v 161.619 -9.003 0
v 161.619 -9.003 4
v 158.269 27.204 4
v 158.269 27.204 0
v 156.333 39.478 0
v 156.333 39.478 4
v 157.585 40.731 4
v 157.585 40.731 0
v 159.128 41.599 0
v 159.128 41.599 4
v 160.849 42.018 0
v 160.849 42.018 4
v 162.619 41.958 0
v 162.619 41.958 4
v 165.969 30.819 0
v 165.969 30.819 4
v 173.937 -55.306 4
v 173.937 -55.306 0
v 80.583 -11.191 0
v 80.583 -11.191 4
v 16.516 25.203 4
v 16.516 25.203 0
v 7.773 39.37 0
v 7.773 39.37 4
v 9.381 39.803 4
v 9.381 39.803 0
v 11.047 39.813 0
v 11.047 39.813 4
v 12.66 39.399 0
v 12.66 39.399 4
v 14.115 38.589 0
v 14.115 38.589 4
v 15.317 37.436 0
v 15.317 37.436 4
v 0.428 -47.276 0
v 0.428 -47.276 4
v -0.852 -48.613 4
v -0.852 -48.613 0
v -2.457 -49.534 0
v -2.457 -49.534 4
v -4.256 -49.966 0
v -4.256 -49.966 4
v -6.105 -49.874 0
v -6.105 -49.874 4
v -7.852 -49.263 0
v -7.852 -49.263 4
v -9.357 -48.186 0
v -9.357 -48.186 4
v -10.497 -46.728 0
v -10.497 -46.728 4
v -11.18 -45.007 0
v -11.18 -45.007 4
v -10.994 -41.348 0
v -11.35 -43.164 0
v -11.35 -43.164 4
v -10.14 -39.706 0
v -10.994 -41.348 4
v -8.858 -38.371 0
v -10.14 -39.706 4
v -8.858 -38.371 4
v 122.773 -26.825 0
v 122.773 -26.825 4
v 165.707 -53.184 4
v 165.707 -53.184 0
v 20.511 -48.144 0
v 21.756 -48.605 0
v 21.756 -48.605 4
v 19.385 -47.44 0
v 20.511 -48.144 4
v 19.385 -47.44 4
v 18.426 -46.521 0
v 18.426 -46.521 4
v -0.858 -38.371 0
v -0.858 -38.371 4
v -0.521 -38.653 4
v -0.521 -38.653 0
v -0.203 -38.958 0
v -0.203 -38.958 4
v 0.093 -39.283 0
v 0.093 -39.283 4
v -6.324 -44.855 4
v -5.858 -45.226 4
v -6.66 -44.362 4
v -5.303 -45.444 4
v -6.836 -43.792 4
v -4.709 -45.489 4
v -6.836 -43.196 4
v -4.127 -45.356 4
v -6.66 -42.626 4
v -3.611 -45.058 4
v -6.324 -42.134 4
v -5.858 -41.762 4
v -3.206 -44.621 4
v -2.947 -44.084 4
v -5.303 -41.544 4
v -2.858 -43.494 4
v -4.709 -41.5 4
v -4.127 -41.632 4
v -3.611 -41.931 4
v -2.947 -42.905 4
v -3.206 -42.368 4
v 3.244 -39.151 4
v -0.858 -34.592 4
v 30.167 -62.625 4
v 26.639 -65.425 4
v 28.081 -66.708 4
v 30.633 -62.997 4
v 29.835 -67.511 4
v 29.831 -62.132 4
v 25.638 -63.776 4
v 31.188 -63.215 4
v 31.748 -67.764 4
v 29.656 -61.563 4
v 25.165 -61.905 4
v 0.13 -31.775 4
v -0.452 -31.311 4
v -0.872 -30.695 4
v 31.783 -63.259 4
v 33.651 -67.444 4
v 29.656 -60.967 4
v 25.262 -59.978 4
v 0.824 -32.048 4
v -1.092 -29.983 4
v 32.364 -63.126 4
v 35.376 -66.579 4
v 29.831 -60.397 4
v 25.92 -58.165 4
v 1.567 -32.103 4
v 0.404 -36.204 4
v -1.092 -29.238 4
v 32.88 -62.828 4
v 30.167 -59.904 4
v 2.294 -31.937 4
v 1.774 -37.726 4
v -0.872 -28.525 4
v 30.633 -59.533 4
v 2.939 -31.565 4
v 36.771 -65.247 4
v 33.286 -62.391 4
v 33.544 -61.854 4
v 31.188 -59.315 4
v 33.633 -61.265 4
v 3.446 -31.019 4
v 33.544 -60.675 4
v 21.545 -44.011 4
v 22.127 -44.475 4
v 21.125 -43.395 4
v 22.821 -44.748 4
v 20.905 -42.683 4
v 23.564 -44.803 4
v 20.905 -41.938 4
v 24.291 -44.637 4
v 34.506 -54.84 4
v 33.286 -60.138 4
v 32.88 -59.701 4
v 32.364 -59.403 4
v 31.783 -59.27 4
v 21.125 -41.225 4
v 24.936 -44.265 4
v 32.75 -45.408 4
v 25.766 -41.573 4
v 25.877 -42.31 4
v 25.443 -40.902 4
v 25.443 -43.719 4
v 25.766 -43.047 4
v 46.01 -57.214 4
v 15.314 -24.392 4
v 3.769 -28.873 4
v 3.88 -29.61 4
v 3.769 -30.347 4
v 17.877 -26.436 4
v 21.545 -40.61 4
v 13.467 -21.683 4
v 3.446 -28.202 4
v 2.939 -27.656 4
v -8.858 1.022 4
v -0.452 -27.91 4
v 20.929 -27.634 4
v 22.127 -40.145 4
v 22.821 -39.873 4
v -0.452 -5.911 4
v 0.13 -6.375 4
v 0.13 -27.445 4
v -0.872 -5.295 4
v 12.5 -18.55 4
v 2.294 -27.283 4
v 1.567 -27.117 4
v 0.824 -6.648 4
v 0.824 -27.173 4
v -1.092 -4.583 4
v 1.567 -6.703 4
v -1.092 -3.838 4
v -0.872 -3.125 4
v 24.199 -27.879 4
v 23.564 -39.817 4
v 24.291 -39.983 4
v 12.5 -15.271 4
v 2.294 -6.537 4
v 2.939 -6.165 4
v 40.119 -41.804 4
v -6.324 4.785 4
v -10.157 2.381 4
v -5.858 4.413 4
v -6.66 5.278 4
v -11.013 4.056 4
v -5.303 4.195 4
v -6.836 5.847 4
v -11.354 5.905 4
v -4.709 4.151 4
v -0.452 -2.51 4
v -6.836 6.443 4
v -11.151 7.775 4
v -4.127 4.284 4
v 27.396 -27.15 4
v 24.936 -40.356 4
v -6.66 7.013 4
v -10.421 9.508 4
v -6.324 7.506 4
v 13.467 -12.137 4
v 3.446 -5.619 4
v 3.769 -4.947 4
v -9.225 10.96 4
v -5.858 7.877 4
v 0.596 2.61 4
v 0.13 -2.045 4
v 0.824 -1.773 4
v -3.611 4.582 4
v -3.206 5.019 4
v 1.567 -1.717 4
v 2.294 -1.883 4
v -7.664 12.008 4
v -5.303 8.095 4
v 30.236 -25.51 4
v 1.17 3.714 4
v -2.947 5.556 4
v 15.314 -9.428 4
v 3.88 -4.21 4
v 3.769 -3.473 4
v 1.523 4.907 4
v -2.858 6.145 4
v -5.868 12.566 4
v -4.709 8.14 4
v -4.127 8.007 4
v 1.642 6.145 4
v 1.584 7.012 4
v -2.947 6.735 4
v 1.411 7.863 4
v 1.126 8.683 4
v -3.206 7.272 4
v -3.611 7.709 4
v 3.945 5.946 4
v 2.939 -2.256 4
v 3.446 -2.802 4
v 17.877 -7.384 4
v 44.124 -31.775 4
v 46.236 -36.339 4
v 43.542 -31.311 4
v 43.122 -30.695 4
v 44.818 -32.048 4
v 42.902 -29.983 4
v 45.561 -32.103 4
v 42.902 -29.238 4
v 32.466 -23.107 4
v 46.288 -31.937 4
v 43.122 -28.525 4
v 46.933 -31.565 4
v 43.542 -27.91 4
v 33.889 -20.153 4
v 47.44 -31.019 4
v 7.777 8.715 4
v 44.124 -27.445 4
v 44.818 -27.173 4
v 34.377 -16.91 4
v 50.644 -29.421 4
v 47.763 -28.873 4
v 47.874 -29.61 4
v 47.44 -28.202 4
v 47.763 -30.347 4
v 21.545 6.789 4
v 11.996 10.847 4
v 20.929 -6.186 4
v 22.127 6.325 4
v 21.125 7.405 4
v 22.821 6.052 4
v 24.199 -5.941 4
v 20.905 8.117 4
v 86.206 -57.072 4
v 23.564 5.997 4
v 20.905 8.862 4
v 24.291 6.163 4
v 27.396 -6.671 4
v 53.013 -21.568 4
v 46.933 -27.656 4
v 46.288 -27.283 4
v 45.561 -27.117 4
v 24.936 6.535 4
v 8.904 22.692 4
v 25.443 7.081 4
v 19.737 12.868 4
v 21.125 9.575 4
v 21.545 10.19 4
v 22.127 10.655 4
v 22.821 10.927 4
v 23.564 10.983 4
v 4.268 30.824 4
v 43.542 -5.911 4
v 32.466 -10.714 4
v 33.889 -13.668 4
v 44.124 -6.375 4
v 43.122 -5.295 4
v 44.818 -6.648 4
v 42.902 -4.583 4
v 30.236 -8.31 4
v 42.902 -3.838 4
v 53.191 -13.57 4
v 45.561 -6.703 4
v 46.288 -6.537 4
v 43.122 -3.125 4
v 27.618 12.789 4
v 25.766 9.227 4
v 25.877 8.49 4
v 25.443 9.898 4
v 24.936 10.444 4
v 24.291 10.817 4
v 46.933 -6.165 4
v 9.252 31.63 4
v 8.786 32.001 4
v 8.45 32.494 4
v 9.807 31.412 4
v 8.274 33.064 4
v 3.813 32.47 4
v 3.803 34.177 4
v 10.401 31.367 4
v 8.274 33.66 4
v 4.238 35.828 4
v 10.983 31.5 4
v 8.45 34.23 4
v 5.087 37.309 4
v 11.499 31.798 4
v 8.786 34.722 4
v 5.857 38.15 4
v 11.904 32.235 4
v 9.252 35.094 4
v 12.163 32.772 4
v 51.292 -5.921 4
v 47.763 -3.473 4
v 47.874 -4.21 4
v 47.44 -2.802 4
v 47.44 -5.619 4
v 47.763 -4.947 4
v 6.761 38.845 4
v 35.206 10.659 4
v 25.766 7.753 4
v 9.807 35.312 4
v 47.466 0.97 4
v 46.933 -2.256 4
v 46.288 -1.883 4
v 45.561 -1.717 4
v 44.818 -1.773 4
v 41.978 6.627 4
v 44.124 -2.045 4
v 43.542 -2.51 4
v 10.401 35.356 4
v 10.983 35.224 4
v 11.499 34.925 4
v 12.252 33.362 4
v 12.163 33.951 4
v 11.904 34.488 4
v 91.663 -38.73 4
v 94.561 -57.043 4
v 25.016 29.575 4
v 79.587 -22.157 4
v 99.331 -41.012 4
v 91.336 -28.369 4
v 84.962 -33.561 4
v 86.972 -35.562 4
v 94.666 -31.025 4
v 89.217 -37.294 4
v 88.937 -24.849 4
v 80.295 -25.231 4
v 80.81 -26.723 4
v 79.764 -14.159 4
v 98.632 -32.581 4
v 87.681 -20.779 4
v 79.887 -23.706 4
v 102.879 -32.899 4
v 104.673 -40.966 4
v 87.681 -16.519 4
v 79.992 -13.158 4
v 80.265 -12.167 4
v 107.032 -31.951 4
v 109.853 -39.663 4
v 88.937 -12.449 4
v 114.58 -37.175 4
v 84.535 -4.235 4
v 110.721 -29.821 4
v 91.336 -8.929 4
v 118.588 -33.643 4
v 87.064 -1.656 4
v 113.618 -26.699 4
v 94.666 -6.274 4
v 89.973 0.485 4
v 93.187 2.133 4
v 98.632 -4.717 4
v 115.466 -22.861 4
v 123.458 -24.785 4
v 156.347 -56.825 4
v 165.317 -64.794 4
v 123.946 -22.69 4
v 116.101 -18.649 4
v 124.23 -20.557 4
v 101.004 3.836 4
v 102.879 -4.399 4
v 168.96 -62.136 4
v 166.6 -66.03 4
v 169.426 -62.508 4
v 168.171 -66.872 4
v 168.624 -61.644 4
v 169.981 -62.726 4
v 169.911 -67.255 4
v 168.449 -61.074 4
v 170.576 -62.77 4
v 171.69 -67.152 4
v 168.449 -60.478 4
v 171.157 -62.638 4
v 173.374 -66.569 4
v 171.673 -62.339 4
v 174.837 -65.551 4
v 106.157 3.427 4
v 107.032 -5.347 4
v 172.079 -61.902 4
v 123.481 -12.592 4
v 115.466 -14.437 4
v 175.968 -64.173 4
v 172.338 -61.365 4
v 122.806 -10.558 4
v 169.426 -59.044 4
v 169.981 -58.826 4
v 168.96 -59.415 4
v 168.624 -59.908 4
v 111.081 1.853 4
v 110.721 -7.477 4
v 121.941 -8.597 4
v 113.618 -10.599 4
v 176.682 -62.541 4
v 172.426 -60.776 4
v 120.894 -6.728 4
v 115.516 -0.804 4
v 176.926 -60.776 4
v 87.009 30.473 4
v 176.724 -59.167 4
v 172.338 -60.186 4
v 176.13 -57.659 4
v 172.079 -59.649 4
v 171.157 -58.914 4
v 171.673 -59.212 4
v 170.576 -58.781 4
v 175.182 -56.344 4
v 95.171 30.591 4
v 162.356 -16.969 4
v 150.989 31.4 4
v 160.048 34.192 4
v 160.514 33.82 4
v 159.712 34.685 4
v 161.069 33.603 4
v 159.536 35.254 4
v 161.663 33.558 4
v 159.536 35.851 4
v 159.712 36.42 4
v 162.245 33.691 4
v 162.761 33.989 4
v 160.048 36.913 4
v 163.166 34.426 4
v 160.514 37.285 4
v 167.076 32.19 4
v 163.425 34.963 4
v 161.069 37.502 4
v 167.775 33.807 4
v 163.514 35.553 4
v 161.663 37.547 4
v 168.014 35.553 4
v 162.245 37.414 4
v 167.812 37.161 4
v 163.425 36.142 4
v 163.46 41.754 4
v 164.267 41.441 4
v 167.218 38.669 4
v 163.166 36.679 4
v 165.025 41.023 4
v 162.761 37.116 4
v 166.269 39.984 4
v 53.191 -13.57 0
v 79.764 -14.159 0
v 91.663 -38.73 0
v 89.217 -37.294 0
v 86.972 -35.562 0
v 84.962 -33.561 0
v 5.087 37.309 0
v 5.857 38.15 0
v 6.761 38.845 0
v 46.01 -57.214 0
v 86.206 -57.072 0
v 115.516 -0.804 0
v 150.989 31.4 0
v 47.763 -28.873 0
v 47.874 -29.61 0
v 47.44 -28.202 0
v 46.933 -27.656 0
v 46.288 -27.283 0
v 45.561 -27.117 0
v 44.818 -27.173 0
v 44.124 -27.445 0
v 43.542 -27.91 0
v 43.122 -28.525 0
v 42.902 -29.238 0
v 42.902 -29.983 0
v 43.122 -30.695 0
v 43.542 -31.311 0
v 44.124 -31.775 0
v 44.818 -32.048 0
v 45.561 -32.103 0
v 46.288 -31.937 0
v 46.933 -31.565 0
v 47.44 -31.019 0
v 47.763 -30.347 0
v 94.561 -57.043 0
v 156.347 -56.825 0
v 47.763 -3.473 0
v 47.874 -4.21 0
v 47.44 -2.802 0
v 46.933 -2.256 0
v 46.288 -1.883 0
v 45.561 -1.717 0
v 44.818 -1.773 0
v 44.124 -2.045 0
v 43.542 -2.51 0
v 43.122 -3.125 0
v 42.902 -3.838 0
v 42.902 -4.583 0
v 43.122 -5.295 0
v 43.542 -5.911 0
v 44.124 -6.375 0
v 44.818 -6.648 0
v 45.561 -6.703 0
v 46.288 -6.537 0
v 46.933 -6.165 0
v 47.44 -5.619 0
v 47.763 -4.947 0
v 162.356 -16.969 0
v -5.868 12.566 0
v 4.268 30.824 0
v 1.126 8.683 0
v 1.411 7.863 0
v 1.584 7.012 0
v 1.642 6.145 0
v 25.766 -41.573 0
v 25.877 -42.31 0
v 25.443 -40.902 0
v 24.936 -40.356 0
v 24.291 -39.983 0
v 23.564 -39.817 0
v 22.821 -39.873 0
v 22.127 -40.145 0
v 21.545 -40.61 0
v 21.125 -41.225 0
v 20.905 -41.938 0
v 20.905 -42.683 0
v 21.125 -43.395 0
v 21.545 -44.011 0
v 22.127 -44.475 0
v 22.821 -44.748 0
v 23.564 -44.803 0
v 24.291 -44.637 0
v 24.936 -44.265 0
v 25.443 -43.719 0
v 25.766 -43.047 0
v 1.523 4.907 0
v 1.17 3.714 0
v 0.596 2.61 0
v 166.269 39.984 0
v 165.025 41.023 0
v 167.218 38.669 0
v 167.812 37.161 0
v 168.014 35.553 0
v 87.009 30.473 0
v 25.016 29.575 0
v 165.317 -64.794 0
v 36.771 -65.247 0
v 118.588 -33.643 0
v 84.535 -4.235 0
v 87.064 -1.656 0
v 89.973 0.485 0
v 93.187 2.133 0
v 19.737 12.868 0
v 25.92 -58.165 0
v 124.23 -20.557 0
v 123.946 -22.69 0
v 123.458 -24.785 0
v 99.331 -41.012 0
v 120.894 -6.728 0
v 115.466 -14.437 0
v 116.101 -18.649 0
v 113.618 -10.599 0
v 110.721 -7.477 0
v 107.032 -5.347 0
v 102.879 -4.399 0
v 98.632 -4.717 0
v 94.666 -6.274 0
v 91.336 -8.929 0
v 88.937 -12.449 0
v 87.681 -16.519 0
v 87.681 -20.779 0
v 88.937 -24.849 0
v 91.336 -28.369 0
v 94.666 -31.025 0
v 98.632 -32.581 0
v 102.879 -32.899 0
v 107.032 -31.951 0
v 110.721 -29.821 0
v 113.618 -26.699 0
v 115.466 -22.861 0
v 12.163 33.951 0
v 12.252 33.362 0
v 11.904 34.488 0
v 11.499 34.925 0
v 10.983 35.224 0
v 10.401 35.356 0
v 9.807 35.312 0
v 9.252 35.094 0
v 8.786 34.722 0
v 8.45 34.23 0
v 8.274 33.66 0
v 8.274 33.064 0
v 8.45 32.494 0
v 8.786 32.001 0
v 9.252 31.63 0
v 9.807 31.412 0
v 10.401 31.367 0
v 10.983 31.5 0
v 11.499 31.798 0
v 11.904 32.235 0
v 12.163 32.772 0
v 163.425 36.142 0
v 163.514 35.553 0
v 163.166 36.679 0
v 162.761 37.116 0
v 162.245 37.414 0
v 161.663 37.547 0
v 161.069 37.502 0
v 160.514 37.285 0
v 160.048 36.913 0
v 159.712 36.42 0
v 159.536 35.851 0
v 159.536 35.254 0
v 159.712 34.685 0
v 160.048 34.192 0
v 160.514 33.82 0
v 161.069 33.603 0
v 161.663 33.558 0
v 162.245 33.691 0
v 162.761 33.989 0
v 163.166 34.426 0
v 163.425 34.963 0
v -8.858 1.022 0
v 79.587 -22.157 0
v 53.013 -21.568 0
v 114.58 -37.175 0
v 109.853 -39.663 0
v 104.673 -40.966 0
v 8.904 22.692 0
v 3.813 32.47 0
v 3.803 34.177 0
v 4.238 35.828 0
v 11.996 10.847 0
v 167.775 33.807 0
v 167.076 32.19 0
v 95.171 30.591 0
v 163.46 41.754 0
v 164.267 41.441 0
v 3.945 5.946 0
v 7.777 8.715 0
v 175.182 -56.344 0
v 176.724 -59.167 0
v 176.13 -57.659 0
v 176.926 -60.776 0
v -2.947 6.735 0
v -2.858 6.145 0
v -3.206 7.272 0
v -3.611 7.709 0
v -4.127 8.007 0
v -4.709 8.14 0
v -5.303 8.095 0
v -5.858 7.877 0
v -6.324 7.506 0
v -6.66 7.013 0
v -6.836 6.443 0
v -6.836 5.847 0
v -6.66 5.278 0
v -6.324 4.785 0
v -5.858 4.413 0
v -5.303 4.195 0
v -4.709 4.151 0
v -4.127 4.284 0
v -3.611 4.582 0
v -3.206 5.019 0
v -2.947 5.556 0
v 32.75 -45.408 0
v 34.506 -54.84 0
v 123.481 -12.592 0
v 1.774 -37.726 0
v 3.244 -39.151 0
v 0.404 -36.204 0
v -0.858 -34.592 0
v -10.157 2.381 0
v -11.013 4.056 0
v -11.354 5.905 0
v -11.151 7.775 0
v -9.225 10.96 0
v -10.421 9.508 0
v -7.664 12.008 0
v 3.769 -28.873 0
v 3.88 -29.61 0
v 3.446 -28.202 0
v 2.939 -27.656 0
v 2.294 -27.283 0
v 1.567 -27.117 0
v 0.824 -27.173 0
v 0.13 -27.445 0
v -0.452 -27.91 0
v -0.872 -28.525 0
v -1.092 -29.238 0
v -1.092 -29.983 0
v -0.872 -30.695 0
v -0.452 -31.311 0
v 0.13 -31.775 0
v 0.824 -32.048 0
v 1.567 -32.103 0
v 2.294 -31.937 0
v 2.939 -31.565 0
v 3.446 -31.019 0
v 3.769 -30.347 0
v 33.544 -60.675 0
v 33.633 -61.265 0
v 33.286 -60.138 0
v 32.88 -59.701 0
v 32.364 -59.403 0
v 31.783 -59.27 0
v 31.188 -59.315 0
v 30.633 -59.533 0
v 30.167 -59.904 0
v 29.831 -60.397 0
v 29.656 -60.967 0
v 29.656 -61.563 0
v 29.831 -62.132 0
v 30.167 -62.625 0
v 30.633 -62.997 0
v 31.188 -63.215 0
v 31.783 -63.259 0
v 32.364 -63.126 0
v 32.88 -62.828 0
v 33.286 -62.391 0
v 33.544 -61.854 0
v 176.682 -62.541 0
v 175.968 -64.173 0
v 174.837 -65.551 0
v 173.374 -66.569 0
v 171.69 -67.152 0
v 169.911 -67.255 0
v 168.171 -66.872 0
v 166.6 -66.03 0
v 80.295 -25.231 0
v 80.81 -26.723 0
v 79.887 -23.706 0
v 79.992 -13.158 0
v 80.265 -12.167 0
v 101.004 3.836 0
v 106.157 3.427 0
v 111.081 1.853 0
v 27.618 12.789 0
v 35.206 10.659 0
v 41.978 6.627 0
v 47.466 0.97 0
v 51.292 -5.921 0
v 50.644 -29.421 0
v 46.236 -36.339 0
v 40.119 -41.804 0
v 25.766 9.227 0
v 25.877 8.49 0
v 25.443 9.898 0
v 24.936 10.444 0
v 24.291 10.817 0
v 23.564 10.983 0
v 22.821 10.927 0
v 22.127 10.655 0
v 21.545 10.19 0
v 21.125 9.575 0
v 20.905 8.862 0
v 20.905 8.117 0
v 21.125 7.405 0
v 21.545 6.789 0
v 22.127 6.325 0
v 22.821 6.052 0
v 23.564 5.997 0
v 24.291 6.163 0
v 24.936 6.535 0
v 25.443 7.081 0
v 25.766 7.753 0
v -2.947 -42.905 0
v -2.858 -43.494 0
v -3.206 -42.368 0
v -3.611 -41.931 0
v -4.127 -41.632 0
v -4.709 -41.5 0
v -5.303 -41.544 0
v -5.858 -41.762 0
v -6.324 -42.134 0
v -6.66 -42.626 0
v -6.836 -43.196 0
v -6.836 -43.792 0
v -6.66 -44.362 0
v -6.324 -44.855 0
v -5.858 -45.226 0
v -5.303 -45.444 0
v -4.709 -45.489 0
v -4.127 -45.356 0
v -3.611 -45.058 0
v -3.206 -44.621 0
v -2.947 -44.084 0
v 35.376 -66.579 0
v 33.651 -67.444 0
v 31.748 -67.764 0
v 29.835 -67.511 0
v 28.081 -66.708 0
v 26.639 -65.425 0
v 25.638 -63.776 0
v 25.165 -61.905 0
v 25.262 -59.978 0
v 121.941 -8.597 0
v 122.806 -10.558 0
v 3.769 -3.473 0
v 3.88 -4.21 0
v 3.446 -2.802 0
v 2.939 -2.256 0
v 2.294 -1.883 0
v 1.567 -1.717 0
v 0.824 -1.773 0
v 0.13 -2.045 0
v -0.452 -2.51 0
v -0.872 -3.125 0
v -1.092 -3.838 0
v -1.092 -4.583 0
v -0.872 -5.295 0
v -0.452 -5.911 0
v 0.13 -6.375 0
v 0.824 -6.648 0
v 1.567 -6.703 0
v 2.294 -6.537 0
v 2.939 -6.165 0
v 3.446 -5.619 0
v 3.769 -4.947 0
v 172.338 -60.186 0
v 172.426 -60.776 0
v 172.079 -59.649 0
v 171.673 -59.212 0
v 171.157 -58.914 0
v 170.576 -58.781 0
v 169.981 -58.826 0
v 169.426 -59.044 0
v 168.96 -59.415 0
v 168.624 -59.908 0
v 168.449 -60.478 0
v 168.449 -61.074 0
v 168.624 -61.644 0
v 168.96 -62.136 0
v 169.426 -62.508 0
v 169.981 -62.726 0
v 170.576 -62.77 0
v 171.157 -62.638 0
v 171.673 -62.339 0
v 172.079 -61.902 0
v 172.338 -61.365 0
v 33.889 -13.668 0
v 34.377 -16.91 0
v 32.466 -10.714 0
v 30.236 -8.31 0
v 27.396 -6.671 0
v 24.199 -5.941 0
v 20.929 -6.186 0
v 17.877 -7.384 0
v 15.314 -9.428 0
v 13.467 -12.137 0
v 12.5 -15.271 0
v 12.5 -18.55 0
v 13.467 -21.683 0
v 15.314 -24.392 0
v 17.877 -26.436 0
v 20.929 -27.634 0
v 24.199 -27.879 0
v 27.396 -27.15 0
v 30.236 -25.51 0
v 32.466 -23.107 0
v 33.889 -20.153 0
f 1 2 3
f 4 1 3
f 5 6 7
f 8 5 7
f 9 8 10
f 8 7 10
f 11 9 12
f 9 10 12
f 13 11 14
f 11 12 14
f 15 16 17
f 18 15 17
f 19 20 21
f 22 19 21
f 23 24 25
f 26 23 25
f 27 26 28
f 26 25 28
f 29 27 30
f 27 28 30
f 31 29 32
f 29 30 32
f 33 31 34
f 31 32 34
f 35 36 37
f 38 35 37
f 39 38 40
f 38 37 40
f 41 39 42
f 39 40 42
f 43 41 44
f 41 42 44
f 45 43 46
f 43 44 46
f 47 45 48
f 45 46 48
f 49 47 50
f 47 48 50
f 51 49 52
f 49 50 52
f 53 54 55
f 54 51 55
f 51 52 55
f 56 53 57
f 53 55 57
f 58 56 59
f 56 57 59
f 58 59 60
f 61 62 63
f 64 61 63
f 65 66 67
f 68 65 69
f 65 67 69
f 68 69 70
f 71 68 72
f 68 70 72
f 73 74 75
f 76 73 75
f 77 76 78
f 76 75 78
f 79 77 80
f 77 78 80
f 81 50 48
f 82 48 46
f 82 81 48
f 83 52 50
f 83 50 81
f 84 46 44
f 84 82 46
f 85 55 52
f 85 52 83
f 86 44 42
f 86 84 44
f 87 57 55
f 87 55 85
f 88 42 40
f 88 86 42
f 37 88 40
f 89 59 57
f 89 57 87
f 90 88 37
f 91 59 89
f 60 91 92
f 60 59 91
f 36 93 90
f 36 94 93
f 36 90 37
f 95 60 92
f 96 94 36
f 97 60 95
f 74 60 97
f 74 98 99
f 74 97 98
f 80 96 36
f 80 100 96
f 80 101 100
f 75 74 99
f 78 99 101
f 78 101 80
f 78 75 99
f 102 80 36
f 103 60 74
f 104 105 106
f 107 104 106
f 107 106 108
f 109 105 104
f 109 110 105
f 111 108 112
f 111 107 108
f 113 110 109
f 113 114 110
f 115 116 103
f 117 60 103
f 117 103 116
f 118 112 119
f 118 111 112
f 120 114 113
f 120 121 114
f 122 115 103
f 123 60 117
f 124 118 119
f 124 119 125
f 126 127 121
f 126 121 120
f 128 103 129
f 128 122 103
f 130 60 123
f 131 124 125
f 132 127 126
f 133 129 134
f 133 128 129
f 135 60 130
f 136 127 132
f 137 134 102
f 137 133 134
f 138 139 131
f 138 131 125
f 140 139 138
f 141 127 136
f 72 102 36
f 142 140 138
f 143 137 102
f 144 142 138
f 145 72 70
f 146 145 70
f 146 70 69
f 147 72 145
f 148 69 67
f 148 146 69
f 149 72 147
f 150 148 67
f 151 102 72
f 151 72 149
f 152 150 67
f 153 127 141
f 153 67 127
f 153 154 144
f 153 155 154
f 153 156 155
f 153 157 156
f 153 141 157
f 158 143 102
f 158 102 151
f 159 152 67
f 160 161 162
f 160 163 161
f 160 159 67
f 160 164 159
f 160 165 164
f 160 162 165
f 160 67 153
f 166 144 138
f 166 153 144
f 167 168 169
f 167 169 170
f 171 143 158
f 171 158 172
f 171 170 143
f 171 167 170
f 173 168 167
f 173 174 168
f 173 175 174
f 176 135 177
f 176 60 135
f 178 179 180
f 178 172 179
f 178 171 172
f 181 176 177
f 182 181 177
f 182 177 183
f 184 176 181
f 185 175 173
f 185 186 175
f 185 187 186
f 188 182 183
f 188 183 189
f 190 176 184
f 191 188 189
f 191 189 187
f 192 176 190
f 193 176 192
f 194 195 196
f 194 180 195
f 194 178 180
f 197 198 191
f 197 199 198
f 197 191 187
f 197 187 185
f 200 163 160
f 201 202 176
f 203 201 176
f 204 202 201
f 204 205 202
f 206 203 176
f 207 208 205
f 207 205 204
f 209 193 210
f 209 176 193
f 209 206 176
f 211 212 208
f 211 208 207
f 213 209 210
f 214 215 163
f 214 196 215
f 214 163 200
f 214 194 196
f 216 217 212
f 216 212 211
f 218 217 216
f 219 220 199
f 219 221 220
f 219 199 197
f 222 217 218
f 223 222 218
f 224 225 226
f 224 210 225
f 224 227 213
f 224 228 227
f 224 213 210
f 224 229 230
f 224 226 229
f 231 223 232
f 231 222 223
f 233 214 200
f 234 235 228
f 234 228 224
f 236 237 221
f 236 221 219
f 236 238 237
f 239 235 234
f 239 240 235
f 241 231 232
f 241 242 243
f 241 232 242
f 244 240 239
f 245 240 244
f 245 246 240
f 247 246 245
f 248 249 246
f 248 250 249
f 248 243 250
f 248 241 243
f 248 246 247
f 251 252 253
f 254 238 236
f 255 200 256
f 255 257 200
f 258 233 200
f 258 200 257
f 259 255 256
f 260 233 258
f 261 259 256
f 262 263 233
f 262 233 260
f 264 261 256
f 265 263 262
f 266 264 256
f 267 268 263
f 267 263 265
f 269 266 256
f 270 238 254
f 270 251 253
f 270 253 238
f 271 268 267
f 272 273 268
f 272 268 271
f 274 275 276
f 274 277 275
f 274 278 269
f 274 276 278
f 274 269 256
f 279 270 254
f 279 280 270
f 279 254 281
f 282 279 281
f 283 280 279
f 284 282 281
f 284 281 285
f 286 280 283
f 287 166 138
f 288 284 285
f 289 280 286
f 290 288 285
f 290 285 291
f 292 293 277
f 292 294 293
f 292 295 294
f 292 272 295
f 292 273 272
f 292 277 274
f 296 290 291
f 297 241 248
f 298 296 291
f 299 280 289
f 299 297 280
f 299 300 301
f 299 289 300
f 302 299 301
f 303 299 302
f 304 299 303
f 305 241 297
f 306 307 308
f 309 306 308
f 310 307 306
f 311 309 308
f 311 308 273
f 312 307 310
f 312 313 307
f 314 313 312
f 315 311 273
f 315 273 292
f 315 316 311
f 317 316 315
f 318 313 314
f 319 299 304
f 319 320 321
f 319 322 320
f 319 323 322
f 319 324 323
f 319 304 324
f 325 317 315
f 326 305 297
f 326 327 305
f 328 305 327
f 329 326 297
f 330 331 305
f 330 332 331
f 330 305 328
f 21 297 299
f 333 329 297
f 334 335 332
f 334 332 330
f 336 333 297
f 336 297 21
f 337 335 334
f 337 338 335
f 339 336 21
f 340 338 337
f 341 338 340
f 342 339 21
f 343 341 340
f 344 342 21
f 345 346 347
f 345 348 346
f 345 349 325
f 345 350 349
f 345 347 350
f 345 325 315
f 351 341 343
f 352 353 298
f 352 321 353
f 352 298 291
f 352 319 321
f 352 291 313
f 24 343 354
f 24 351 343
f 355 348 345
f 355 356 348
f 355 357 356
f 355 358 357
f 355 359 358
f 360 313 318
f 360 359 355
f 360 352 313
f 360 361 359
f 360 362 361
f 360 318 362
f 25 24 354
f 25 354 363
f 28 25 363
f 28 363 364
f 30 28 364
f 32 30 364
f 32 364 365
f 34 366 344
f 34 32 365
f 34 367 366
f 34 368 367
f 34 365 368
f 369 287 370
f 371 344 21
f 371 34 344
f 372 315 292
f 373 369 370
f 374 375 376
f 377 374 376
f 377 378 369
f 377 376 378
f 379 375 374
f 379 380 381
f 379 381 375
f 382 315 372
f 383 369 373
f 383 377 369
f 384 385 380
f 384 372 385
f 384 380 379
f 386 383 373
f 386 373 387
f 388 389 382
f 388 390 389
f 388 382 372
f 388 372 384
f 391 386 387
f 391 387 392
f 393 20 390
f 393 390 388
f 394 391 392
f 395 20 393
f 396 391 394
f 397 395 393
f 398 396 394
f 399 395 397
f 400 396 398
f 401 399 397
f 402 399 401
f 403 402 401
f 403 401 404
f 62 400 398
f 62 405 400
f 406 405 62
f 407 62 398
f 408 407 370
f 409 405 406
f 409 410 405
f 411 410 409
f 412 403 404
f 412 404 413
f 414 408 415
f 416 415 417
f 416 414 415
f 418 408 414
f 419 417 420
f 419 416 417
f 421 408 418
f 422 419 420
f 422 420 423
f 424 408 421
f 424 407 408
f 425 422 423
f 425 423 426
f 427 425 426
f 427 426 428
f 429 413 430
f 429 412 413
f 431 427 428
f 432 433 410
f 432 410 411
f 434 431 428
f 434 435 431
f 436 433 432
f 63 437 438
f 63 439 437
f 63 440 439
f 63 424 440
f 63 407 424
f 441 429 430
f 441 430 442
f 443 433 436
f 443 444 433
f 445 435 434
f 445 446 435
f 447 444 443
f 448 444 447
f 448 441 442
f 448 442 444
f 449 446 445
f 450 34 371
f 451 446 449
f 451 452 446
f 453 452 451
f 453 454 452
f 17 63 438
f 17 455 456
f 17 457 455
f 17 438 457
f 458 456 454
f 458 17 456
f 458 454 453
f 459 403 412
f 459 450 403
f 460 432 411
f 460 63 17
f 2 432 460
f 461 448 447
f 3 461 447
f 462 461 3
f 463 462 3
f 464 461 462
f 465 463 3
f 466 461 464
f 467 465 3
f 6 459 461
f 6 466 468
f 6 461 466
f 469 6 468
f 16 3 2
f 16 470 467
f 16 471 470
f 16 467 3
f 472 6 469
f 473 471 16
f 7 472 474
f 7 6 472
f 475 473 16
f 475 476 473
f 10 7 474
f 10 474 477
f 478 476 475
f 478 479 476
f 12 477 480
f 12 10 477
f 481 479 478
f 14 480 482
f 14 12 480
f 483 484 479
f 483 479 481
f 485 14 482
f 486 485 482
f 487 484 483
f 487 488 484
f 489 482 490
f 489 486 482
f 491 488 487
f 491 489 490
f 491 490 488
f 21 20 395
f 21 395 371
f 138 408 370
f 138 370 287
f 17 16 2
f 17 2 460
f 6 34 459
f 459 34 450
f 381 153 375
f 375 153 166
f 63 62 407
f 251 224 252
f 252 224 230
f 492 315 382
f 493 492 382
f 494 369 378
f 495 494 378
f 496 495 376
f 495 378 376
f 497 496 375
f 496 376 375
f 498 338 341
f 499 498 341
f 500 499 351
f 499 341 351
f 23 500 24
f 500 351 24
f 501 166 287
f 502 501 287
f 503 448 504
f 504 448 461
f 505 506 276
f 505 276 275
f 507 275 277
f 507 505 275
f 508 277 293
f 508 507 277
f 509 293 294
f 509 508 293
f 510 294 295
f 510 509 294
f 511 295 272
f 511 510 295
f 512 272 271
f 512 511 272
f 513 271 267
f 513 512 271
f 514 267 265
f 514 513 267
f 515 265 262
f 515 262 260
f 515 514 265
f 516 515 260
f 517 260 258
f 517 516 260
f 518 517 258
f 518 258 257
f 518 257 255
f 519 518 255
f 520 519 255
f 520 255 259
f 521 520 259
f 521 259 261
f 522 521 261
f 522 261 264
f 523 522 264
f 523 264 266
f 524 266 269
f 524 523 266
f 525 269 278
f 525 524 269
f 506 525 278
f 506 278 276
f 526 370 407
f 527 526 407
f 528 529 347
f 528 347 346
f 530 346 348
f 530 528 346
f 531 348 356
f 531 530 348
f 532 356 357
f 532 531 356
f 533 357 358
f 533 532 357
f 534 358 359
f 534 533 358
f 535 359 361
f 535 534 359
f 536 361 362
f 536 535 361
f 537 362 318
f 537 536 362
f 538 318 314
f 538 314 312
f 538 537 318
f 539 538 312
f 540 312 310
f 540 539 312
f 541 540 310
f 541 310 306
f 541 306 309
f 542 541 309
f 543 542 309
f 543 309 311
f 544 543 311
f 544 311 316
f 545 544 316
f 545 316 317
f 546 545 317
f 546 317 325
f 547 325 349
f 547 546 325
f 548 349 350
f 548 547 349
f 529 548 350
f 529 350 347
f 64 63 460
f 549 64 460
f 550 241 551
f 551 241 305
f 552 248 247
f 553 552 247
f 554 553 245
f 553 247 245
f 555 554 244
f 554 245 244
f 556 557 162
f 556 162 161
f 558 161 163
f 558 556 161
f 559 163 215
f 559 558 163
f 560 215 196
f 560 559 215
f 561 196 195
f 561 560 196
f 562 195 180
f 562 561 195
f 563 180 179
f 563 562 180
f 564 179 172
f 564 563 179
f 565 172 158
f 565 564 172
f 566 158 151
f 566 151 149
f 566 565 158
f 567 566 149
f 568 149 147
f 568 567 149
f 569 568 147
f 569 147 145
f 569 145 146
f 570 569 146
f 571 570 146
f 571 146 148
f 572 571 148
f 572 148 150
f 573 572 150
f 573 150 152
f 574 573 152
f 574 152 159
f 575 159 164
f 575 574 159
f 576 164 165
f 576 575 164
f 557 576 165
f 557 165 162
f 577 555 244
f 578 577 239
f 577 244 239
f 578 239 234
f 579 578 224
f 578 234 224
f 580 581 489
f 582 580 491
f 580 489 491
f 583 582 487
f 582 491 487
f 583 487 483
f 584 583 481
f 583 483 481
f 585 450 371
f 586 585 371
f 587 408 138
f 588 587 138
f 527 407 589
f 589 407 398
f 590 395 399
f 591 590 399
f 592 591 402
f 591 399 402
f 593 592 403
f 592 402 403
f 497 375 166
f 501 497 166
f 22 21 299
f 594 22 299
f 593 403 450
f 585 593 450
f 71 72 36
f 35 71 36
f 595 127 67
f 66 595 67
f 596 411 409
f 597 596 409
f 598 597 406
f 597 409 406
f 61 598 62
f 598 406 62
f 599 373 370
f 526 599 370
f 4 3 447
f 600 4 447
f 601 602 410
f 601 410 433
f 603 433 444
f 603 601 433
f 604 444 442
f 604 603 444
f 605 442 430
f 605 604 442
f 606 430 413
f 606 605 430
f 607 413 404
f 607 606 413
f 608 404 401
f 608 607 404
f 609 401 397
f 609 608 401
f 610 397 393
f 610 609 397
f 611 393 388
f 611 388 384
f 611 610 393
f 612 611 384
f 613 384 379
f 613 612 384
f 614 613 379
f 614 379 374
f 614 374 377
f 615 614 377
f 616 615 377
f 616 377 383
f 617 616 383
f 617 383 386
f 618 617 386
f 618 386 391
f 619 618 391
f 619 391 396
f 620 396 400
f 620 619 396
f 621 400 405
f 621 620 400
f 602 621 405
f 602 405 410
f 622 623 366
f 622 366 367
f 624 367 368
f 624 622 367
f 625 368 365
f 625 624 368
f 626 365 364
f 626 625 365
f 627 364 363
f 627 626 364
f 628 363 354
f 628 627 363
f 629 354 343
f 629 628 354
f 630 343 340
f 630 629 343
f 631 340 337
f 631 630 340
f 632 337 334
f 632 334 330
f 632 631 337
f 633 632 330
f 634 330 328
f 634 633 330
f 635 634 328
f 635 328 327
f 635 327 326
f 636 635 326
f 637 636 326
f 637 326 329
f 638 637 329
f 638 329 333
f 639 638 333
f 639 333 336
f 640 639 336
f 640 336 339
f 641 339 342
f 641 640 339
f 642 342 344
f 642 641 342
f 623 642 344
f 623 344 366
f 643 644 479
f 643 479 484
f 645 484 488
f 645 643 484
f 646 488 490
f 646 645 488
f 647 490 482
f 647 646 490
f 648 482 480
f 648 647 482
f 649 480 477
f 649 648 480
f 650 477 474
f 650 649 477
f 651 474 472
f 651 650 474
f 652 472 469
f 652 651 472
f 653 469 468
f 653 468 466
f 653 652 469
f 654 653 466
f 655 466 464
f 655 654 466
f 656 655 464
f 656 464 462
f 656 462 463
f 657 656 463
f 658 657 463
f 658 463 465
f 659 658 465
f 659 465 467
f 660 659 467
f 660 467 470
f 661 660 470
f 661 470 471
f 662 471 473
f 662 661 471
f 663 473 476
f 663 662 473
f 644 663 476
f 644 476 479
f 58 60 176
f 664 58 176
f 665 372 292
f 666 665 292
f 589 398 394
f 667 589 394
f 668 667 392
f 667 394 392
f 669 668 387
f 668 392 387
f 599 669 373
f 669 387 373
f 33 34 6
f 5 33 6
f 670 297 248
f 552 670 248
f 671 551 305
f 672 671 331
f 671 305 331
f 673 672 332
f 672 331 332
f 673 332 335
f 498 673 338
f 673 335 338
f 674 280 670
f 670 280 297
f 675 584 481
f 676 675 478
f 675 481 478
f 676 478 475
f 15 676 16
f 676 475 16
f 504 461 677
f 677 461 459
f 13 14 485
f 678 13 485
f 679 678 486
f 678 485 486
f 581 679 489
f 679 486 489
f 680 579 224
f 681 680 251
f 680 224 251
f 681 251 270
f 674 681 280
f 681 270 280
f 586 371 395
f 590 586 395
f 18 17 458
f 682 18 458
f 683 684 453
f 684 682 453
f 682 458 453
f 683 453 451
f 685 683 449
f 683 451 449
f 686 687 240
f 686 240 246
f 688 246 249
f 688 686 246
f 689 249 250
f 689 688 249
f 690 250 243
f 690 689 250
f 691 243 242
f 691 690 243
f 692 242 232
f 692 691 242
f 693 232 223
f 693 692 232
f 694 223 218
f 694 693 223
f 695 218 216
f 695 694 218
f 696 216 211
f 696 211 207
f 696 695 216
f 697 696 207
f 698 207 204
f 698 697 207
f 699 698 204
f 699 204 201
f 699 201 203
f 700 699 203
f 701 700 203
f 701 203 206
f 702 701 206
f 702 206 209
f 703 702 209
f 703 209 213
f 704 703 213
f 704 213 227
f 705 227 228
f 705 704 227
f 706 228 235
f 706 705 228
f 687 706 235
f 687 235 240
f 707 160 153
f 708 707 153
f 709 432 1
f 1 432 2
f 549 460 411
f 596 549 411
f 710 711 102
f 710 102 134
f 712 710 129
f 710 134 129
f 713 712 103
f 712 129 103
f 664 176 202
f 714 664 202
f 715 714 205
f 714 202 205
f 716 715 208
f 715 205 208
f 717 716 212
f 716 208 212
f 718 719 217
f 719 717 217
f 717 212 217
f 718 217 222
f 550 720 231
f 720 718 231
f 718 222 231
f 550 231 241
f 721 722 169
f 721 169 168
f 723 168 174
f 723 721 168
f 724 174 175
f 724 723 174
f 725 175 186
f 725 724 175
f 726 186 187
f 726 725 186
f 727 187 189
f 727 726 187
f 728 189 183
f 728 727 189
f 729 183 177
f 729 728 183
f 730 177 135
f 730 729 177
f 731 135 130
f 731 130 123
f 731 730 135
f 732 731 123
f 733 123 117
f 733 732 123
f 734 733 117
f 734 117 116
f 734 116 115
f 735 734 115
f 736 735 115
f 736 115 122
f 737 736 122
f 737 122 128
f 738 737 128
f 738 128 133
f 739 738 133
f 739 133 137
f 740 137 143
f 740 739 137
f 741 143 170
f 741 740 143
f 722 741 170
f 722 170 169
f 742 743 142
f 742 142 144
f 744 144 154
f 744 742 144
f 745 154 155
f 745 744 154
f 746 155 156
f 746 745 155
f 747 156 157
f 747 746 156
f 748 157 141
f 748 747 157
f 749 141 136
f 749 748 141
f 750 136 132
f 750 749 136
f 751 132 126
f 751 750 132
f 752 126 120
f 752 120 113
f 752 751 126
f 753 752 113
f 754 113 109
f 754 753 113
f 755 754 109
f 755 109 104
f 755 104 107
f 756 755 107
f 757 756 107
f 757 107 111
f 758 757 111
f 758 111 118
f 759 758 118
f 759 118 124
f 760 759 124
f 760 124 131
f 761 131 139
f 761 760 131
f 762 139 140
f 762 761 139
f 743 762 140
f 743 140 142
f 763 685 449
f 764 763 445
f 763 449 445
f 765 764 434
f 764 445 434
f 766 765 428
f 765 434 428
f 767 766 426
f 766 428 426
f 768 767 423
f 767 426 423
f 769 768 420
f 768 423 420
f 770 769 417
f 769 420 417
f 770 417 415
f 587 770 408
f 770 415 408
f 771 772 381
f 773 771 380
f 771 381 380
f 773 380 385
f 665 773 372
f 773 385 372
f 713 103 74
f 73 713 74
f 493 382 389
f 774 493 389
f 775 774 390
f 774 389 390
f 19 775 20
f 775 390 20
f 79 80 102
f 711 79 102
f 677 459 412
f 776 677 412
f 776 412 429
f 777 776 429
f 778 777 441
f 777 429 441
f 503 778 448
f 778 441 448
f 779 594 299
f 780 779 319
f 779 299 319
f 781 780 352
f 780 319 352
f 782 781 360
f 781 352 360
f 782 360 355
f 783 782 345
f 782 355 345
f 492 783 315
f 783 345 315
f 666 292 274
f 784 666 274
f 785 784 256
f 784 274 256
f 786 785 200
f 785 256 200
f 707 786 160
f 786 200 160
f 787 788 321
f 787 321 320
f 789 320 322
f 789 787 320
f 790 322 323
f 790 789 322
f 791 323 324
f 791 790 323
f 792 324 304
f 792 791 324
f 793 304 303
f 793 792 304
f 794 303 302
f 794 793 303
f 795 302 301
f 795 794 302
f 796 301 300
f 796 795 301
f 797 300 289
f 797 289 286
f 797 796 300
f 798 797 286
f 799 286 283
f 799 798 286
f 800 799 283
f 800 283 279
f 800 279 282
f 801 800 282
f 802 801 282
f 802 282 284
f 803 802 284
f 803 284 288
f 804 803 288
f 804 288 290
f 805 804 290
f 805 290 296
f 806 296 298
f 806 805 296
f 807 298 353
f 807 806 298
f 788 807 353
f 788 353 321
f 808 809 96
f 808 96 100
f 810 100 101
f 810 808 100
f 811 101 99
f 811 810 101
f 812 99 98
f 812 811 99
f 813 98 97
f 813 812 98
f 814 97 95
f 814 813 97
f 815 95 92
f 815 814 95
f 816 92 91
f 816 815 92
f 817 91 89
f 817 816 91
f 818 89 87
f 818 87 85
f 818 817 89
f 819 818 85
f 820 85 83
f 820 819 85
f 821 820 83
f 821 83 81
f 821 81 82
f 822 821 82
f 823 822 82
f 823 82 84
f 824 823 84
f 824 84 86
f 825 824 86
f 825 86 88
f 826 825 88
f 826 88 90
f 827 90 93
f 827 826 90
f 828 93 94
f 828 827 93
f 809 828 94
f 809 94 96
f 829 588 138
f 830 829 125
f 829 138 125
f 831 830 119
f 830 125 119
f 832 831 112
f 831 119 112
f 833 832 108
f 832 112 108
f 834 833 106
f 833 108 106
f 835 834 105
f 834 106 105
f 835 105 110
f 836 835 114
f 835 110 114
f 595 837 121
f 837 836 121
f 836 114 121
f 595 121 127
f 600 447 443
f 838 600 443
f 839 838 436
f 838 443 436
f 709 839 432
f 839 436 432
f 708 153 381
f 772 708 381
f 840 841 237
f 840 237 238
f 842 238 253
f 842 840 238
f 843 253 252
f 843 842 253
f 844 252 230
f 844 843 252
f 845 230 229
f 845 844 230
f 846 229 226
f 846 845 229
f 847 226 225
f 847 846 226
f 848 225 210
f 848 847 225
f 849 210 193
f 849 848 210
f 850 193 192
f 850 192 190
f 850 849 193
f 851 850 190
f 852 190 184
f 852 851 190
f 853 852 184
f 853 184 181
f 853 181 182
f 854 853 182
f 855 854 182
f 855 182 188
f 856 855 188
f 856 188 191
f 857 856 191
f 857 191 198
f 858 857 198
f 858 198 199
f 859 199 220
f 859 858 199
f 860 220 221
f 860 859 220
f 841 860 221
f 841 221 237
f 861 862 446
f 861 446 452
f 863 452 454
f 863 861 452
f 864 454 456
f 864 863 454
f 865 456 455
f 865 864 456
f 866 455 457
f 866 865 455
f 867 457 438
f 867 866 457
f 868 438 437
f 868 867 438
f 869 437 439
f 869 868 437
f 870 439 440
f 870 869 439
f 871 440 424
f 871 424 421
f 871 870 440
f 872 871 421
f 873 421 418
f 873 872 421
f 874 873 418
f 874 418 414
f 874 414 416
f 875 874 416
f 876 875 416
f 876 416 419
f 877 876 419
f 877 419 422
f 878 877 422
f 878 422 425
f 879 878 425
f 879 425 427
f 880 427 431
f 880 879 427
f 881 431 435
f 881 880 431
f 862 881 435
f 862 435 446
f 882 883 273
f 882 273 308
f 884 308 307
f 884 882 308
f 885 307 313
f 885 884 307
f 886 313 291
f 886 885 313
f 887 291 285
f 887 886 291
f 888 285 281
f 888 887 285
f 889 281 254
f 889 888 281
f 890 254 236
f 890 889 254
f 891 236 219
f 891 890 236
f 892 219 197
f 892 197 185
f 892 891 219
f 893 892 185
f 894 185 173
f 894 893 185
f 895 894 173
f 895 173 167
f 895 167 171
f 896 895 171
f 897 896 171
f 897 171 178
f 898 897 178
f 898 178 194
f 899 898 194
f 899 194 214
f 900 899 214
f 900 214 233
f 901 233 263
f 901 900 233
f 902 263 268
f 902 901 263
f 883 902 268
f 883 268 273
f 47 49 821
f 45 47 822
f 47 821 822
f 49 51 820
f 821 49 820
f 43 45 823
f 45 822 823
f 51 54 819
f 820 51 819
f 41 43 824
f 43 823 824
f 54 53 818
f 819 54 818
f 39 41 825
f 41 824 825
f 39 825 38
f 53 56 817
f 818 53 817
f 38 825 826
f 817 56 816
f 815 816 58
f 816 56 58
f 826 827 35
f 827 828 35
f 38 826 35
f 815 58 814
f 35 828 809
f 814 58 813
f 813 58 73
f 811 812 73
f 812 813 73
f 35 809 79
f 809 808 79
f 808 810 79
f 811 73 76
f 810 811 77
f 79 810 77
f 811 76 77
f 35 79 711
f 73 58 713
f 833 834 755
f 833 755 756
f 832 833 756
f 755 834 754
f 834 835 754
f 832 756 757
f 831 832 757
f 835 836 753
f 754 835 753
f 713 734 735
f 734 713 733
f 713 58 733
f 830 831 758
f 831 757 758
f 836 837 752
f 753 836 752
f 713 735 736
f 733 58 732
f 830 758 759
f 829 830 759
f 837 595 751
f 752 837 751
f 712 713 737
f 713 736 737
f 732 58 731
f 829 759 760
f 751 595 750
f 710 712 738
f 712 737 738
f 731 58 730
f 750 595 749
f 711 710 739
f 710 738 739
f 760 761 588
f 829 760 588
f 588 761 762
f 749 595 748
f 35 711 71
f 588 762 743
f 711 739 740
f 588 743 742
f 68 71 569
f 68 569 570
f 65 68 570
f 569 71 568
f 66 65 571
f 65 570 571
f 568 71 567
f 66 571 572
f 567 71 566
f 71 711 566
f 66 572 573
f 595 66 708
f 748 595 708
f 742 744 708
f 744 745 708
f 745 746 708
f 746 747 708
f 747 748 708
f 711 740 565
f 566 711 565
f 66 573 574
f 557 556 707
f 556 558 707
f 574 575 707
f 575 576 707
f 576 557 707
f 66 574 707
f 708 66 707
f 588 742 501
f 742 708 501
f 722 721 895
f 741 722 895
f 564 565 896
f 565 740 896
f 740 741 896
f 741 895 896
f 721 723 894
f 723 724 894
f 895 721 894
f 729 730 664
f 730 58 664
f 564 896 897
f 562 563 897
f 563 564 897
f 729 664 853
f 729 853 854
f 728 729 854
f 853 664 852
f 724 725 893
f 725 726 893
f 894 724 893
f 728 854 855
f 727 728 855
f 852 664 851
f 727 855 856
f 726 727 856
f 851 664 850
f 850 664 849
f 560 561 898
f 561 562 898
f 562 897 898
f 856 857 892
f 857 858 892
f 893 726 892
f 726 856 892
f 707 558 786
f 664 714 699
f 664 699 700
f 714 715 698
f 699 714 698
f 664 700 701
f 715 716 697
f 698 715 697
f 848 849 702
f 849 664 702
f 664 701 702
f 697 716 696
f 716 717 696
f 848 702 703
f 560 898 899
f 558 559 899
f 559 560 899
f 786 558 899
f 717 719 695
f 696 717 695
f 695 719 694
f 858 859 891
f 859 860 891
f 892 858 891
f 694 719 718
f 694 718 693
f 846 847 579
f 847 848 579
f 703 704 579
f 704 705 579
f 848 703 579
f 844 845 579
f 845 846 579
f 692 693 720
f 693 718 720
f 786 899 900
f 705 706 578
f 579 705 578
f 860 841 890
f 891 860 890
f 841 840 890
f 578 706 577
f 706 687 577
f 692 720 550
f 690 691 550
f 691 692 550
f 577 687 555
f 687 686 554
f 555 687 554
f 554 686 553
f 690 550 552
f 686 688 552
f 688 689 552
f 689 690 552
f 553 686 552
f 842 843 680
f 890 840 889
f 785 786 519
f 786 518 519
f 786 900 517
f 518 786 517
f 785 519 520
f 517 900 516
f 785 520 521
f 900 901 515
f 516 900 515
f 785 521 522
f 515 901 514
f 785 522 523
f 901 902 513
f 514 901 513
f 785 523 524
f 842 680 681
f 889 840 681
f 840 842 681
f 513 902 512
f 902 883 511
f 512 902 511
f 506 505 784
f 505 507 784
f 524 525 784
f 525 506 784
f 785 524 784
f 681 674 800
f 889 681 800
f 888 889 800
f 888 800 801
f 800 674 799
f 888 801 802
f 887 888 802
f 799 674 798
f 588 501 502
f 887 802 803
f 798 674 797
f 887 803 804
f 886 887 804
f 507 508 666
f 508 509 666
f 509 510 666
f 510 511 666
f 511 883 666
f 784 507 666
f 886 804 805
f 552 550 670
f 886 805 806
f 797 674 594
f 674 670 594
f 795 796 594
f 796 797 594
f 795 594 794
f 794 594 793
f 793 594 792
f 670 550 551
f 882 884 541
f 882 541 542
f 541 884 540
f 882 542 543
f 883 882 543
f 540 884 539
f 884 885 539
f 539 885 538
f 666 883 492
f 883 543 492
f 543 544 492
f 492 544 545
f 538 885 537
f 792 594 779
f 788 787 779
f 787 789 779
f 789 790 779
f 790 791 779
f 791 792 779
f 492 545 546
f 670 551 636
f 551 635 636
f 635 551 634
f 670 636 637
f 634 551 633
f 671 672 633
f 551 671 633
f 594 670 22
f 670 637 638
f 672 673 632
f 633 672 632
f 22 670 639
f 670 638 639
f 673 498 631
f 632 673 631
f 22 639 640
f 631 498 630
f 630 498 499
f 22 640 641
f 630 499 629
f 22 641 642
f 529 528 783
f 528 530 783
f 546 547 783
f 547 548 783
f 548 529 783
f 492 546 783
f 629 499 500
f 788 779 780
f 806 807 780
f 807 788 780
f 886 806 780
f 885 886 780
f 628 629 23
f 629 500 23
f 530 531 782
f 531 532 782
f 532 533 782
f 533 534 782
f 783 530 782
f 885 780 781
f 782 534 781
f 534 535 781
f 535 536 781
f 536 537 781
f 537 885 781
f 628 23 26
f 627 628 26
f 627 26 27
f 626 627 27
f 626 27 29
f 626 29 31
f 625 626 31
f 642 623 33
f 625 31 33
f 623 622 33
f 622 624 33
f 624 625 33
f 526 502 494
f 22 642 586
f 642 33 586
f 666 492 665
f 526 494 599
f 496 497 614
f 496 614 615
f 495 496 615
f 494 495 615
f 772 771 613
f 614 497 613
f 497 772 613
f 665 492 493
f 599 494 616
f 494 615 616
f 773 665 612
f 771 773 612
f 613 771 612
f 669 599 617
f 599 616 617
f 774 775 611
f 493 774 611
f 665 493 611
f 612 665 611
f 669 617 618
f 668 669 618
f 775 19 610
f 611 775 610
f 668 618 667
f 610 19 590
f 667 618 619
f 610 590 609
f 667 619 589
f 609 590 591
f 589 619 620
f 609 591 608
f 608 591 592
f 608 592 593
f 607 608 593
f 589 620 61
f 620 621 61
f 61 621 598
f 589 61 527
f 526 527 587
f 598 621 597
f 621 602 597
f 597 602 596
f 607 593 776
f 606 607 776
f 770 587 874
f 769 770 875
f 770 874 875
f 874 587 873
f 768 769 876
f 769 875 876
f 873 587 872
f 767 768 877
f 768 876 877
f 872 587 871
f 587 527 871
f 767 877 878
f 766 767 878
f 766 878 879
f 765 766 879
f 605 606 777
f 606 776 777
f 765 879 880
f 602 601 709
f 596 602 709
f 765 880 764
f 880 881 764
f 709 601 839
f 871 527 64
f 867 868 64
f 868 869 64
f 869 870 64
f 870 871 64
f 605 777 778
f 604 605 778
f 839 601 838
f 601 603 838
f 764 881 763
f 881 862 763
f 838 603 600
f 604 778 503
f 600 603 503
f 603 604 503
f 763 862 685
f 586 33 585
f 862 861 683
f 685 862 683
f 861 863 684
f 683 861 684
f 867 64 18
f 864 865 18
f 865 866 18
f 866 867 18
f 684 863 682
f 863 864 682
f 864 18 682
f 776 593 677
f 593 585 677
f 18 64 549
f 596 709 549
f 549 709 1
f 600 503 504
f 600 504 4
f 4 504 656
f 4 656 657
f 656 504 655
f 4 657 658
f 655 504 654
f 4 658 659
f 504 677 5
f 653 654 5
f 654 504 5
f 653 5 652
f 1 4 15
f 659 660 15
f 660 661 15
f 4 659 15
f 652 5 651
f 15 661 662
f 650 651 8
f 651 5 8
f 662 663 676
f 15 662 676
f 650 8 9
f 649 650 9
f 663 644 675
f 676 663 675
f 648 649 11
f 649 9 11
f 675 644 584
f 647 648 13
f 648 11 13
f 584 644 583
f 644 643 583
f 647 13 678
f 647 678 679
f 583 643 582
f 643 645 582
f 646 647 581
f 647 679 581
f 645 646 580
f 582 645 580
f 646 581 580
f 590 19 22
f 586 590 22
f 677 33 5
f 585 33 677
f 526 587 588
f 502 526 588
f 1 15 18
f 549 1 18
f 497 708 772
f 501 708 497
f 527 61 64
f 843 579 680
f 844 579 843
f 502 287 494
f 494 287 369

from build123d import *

# Parameters (mm, degrees)
SKETCH1_W           = 267.603014698
SKETCH1_H           = 153.453144762
SKETCH1_R           = 2
SKETCH1_R_2         = 14.29
SKETCH1_R_3         = 2.499999953
SKETCH1_R_4         = 11
BOSS_EXTRUDE1_DEPTH = 4
SKETCH2_W           = 305.655174706
SKETCH2_H           = 186.291776367
CUT_EXTRUDE8_DEPTH  = 10


with BuildPart() as part:
    # Sketch1 → Boss-Extrude1 (new body)
    with BuildSketch(Plane.XY):
        with Locations((77.263379783, -10.843771022)):
            Rectangle(SKETCH1_W, SKETCH1_H)
        with Locations((-4.85811184, -43.49422294)):
            Circle(SKETCH1_R, mode=Mode.SUBTRACT)
        with Locations((101.811349412, -18.649052962)):
            Circle(SKETCH1_R_2, mode=Mode.SUBTRACT)
        with Locations((31.633252021, -61.264657987)):
            Circle(SKETCH1_R, mode=Mode.SUBTRACT)
        with Locations((10.251922178, 33.361755578)):
            Circle(SKETCH1_R, mode=Mode.SUBTRACT)
        with Locations((170.426367515, -60.775756941)):
            Circle(SKETCH1_R, mode=Mode.SUBTRACT)
        with Locations((161.513898191, 35.55251649)):
            Circle(SKETCH1_R, mode=Mode.SUBTRACT)
        with Locations((-4.85811184, 6.145317428)):
            Circle(SKETCH1_R, mode=Mode.SUBTRACT)
        with Locations((23.377209906, -42.310207828)):
            Circle(SKETCH1_R_3, mode=Mode.SUBTRACT)
        with Locations((23.377209906, -16.910207828)):
            Circle(SKETCH1_R_4, mode=Mode.SUBTRACT)
        with Locations((1.38016465, -29.610207828)):
            Circle(SKETCH1_R_3, mode=Mode.SUBTRACT)
        with Locations((1.38016465, -4.210207828)):
            Circle(SKETCH1_R_3, mode=Mode.SUBTRACT)
        with Locations((23.377209906, 8.489792172)):
            Circle(SKETCH1_R_3, mode=Mode.SUBTRACT)
        with Locations((45.374255162, -4.210207828)):
            Circle(SKETCH1_R_3, mode=Mode.SUBTRACT)
        with Locations((45.374255162, -29.610207828)):
            Circle(SKETCH1_R_3, mode=Mode.SUBTRACT)
    extrude(amount=BOSS_EXTRUDE1_DEPTH)

    # Sketch2 → Cut-Extrude8 (cut)
    # profile 1 of 11: a face of its own
    with BuildSketch(Plane.XY.offset(4)):
        with Locations((67.603615112, -0.467239306)):
            Rectangle(SKETCH2_W, SKETCH2_H)
        with BuildLine():
            Line((15.316933469, 37.435532771), (156.333033267, 39.477900374))
            ThreePointArc((156.333033267, 39.477900374), (159.128219206, 41.598881992), (162.618590728, 41.957955929))
            ThreePointArc((162.618590728, 41.957955929), (163.868628825, 41.61100175), (165.024869365, 41.022715885))
            ThreePointArc((165.024869365, 41.022715885), (167.217901725, 38.66930068), (168.013898191, 35.55251649))
            ThreePointArc((168.013898191, 35.55251649), (167.480787607, 32.974488039), (165.968904131, 30.819343974))
            Line((165.968904131, 30.819343974), (173.937338688, -55.305557546))
            ThreePointArc((173.937338688, -55.305557546), (176.130371049, -57.658972751), (176.926367515, -60.775756941))
            ThreePointArc((176.926367515, -60.775756941), (172.552302777, -66.918264512), (165.317013897, -64.79377954))
            Line((165.317013897, -64.79377954), (36.770785596, -65.246585756))
            ThreePointArc((36.770785596, -65.246585756), (28.080665231, -66.707922367), (25.920047751, -58.164771381))
            Line((25.920047751, -58.164771381), (21.755974451, -48.604776567))
            ThreePointArc((21.755974451, -48.604776567), (19.929745718, -47.82065161), (18.425821295, -46.521353851))
            Line((18.425821295, -46.521353851), (0.428452826, -47.276052396))
            ThreePointArc((0.428452826, -47.276052396), (-9.356992337, -48.185712497), (-8.85811184, -38.370747557))
            Line((-8.85811184, -38.370747557), (-8.85811184, 1.021842045))
            ThreePointArc((-8.85811184, 1.021842045), (-11.150528938, 7.774883952), (-5.868402241, 12.566323058))
            Line((-5.868402241, 12.566323058), (4.267840814, 30.823888318))
            ThreePointArc((4.267840814, 30.823888318), (3.803217243, 34.176743104), (5.087377177, 37.308586577))
            ThreePointArc((5.087377177, 37.308586577), (6.293465571, 38.517395333), (7.772745355, 39.370389556))
            ThreePointArc((7.772745355, 39.370389556), (11.866714012, 39.657980425), (15.316933469, 37.435532771))
        make_face(mode=Mode.SUBTRACT)
    # profile 2 of 11: a face of its own
    with BuildSketch(Plane.XY.offset(4)):
        with BuildLine():
            Line((87.009313409, 30.473030477), (25.016174455, 29.575170029))
            Line((25.016174455, 29.575170029), (84.534856694, -4.234726778))
            ThreePointArc((84.534856694, -4.234726778), (88.475465617, -0.527126923), (93.187242807, 2.132544312))
            Line((93.187242807, 2.132544312), (87.009313409, 30.473030477))
        make_face()
    # profile 3 of 11: a face of its own
    with BuildSketch(Plane.XY.offset(4)):
        with BuildLine():
            Line((115.516142216, -0.804483643), (150.988719582, 31.399658477))
            Line((150.988719582, 31.399658477), (95.171415855, 30.591244026))
            Line((95.171415855, 30.591244026), (101.003681787, 3.83644621))
            ThreePointArc((101.003681787, 3.83644621), (108.66470749, 2.781800569), (115.516142216, -0.804483643))
        make_face()
    # profile 4 of 11: a face of its own
    with BuildSketch(Plane.XY.offset(4)):
        with BuildLine():
            Line((158.26921014, 27.20426024), (120.893532253, -6.72763115))
            ThreePointArc((120.893532253, -6.72763115), (122.397082717, -9.567335928), (123.480802665, -12.592255482))
            Line((123.480802665, -12.592255482), (161.619207477, -9.003377368))
            Line((161.619207477, -9.003377368), (158.26921014, 27.20426024))
        make_face()
    # profile 5 of 11: a face of its own
    with BuildSketch(Plane.XY.offset(4)):
        with BuildLine():
            Line((122.77328809, -26.825062188), (165.706925432, -53.184490212))
            Line((165.706925432, -53.184490212), (162.356235259, -16.969364249))
            Line((162.356235259, -16.969364249), (124.230302911, -20.557068686))
            ThreePointArc((124.230302911, -20.557068686), (123.727037564, -23.743423664), (122.77328809, -26.825062188))
        make_face()
    # profile 6 of 11: a face of its own
    with BuildSketch(Plane.XY.offset(4)):
        with BuildLine():
            Line((94.560961812, -57.042969272), (156.346956485, -56.825327083))
            Line((156.346956485, -56.825327083), (118.587568032, -33.642667897))
            ThreePointArc((118.587568032, -33.642667897), (109.853001514, -39.662901526), (99.330831485, -41.011902307))
            Line((99.330831485, -41.011902307), (94.560961812, -57.042969272))
        make_face()
    # profile 7 of 11: a face of its own
    with BuildSketch(Plane.XY.offset(4)):
        with BuildLine():
            Line((84.962067713, -33.560515205), (46.010236401, -57.213990006))
            Line((46.010236401, -57.213990006), (86.20559517, -57.072401189))
            Line((86.20559517, -57.072401189), (91.663047334, -38.730436503))
            ThreePointArc((91.663047334, -38.730436503), (88.067281455, -36.463389772), (84.962067713, -33.560515205))
        make_face()
    # profile 8 of 11: a face of its own
    with BuildSketch(Plane.XY.offset(4)):
        with BuildLine():
            ThreePointArc((80.809710516, -26.722538187), (80.077925828, -24.47213628), (79.586542538, -22.157323106))
            Line((79.586542538, -22.157323106), (53.013387432, -21.568209721))
            ThreePointArc((53.013387432, -21.568209721), (46.235949771, -36.339001197), (32.750489376, -45.408306571))
            Line((32.750489376, -45.408306571), (34.506149029, -54.840346462))
            Line((34.506149029, -54.840346462), (80.809710516, -26.722538187))
        make_face()
    # profile 9 of 11: a face of its own
    with BuildSketch(Plane.XY.offset(4)):
        with BuildLine():
            ThreePointArc((79.763854917, -14.159288328), (80.122803307, -12.660984172), (80.583447278, -11.190757516))
            Line((80.583447278, -11.190757516), (16.516137359, 25.203010887))
            Line((16.516137359, 25.203010887), (19.736612333, 12.868073675))
            ThreePointArc((19.736612333, 12.868073675), (41.978293765, 6.62698995), (53.190699811, -13.570174942))
            Line((53.190699811, -13.570174942), (79.763854917, -14.159288328))
        make_face()
    # profile 10 of 11: a face of its own
    with BuildSketch(Plane.XY.offset(4)):
        with BuildLine():
            Line((11.996082824, 10.847132577), (8.903504201, 22.692206192))
            Line((8.903504201, 22.692206192), (1.125969524, 8.683184687))
            ThreePointArc((1.125969524, 8.683184687), (1.511602787, 7.440205673), (1.64188816, 6.145317428))
            ThreePointArc((1.64188816, 6.145317428), (1.374954172, 4.30171007), (0.59607644, 2.609524701))
            ThreePointArc((0.59607644, 2.609524701), (5.806508232, 7.405845361), (11.996082824, 10.847132577))
        make_face()
    # profile 11 of 11: a face of its own
    with BuildSketch(Plane.XY.offset(4)):
        with BuildLine():
            Line((-0.85811184, -34.592096299), (-0.85811184, -38.370747557))
            ThreePointArc((-0.85811184, -38.370747557), (-0.359231342, -38.802733382), (0.093276771, -39.283076917))
            Line((0.093276771, -39.283076917), (3.243928256, -39.150958041))
            ThreePointArc((3.243928256, -39.150958041), (1.076110226, -36.976621387), (-0.85811184, -34.592096299))
        make_face()
    extrude(amount=-CUT_EXTRUDE8_DEPTH, mode=Mode.SUBTRACT)


solid = part.part
